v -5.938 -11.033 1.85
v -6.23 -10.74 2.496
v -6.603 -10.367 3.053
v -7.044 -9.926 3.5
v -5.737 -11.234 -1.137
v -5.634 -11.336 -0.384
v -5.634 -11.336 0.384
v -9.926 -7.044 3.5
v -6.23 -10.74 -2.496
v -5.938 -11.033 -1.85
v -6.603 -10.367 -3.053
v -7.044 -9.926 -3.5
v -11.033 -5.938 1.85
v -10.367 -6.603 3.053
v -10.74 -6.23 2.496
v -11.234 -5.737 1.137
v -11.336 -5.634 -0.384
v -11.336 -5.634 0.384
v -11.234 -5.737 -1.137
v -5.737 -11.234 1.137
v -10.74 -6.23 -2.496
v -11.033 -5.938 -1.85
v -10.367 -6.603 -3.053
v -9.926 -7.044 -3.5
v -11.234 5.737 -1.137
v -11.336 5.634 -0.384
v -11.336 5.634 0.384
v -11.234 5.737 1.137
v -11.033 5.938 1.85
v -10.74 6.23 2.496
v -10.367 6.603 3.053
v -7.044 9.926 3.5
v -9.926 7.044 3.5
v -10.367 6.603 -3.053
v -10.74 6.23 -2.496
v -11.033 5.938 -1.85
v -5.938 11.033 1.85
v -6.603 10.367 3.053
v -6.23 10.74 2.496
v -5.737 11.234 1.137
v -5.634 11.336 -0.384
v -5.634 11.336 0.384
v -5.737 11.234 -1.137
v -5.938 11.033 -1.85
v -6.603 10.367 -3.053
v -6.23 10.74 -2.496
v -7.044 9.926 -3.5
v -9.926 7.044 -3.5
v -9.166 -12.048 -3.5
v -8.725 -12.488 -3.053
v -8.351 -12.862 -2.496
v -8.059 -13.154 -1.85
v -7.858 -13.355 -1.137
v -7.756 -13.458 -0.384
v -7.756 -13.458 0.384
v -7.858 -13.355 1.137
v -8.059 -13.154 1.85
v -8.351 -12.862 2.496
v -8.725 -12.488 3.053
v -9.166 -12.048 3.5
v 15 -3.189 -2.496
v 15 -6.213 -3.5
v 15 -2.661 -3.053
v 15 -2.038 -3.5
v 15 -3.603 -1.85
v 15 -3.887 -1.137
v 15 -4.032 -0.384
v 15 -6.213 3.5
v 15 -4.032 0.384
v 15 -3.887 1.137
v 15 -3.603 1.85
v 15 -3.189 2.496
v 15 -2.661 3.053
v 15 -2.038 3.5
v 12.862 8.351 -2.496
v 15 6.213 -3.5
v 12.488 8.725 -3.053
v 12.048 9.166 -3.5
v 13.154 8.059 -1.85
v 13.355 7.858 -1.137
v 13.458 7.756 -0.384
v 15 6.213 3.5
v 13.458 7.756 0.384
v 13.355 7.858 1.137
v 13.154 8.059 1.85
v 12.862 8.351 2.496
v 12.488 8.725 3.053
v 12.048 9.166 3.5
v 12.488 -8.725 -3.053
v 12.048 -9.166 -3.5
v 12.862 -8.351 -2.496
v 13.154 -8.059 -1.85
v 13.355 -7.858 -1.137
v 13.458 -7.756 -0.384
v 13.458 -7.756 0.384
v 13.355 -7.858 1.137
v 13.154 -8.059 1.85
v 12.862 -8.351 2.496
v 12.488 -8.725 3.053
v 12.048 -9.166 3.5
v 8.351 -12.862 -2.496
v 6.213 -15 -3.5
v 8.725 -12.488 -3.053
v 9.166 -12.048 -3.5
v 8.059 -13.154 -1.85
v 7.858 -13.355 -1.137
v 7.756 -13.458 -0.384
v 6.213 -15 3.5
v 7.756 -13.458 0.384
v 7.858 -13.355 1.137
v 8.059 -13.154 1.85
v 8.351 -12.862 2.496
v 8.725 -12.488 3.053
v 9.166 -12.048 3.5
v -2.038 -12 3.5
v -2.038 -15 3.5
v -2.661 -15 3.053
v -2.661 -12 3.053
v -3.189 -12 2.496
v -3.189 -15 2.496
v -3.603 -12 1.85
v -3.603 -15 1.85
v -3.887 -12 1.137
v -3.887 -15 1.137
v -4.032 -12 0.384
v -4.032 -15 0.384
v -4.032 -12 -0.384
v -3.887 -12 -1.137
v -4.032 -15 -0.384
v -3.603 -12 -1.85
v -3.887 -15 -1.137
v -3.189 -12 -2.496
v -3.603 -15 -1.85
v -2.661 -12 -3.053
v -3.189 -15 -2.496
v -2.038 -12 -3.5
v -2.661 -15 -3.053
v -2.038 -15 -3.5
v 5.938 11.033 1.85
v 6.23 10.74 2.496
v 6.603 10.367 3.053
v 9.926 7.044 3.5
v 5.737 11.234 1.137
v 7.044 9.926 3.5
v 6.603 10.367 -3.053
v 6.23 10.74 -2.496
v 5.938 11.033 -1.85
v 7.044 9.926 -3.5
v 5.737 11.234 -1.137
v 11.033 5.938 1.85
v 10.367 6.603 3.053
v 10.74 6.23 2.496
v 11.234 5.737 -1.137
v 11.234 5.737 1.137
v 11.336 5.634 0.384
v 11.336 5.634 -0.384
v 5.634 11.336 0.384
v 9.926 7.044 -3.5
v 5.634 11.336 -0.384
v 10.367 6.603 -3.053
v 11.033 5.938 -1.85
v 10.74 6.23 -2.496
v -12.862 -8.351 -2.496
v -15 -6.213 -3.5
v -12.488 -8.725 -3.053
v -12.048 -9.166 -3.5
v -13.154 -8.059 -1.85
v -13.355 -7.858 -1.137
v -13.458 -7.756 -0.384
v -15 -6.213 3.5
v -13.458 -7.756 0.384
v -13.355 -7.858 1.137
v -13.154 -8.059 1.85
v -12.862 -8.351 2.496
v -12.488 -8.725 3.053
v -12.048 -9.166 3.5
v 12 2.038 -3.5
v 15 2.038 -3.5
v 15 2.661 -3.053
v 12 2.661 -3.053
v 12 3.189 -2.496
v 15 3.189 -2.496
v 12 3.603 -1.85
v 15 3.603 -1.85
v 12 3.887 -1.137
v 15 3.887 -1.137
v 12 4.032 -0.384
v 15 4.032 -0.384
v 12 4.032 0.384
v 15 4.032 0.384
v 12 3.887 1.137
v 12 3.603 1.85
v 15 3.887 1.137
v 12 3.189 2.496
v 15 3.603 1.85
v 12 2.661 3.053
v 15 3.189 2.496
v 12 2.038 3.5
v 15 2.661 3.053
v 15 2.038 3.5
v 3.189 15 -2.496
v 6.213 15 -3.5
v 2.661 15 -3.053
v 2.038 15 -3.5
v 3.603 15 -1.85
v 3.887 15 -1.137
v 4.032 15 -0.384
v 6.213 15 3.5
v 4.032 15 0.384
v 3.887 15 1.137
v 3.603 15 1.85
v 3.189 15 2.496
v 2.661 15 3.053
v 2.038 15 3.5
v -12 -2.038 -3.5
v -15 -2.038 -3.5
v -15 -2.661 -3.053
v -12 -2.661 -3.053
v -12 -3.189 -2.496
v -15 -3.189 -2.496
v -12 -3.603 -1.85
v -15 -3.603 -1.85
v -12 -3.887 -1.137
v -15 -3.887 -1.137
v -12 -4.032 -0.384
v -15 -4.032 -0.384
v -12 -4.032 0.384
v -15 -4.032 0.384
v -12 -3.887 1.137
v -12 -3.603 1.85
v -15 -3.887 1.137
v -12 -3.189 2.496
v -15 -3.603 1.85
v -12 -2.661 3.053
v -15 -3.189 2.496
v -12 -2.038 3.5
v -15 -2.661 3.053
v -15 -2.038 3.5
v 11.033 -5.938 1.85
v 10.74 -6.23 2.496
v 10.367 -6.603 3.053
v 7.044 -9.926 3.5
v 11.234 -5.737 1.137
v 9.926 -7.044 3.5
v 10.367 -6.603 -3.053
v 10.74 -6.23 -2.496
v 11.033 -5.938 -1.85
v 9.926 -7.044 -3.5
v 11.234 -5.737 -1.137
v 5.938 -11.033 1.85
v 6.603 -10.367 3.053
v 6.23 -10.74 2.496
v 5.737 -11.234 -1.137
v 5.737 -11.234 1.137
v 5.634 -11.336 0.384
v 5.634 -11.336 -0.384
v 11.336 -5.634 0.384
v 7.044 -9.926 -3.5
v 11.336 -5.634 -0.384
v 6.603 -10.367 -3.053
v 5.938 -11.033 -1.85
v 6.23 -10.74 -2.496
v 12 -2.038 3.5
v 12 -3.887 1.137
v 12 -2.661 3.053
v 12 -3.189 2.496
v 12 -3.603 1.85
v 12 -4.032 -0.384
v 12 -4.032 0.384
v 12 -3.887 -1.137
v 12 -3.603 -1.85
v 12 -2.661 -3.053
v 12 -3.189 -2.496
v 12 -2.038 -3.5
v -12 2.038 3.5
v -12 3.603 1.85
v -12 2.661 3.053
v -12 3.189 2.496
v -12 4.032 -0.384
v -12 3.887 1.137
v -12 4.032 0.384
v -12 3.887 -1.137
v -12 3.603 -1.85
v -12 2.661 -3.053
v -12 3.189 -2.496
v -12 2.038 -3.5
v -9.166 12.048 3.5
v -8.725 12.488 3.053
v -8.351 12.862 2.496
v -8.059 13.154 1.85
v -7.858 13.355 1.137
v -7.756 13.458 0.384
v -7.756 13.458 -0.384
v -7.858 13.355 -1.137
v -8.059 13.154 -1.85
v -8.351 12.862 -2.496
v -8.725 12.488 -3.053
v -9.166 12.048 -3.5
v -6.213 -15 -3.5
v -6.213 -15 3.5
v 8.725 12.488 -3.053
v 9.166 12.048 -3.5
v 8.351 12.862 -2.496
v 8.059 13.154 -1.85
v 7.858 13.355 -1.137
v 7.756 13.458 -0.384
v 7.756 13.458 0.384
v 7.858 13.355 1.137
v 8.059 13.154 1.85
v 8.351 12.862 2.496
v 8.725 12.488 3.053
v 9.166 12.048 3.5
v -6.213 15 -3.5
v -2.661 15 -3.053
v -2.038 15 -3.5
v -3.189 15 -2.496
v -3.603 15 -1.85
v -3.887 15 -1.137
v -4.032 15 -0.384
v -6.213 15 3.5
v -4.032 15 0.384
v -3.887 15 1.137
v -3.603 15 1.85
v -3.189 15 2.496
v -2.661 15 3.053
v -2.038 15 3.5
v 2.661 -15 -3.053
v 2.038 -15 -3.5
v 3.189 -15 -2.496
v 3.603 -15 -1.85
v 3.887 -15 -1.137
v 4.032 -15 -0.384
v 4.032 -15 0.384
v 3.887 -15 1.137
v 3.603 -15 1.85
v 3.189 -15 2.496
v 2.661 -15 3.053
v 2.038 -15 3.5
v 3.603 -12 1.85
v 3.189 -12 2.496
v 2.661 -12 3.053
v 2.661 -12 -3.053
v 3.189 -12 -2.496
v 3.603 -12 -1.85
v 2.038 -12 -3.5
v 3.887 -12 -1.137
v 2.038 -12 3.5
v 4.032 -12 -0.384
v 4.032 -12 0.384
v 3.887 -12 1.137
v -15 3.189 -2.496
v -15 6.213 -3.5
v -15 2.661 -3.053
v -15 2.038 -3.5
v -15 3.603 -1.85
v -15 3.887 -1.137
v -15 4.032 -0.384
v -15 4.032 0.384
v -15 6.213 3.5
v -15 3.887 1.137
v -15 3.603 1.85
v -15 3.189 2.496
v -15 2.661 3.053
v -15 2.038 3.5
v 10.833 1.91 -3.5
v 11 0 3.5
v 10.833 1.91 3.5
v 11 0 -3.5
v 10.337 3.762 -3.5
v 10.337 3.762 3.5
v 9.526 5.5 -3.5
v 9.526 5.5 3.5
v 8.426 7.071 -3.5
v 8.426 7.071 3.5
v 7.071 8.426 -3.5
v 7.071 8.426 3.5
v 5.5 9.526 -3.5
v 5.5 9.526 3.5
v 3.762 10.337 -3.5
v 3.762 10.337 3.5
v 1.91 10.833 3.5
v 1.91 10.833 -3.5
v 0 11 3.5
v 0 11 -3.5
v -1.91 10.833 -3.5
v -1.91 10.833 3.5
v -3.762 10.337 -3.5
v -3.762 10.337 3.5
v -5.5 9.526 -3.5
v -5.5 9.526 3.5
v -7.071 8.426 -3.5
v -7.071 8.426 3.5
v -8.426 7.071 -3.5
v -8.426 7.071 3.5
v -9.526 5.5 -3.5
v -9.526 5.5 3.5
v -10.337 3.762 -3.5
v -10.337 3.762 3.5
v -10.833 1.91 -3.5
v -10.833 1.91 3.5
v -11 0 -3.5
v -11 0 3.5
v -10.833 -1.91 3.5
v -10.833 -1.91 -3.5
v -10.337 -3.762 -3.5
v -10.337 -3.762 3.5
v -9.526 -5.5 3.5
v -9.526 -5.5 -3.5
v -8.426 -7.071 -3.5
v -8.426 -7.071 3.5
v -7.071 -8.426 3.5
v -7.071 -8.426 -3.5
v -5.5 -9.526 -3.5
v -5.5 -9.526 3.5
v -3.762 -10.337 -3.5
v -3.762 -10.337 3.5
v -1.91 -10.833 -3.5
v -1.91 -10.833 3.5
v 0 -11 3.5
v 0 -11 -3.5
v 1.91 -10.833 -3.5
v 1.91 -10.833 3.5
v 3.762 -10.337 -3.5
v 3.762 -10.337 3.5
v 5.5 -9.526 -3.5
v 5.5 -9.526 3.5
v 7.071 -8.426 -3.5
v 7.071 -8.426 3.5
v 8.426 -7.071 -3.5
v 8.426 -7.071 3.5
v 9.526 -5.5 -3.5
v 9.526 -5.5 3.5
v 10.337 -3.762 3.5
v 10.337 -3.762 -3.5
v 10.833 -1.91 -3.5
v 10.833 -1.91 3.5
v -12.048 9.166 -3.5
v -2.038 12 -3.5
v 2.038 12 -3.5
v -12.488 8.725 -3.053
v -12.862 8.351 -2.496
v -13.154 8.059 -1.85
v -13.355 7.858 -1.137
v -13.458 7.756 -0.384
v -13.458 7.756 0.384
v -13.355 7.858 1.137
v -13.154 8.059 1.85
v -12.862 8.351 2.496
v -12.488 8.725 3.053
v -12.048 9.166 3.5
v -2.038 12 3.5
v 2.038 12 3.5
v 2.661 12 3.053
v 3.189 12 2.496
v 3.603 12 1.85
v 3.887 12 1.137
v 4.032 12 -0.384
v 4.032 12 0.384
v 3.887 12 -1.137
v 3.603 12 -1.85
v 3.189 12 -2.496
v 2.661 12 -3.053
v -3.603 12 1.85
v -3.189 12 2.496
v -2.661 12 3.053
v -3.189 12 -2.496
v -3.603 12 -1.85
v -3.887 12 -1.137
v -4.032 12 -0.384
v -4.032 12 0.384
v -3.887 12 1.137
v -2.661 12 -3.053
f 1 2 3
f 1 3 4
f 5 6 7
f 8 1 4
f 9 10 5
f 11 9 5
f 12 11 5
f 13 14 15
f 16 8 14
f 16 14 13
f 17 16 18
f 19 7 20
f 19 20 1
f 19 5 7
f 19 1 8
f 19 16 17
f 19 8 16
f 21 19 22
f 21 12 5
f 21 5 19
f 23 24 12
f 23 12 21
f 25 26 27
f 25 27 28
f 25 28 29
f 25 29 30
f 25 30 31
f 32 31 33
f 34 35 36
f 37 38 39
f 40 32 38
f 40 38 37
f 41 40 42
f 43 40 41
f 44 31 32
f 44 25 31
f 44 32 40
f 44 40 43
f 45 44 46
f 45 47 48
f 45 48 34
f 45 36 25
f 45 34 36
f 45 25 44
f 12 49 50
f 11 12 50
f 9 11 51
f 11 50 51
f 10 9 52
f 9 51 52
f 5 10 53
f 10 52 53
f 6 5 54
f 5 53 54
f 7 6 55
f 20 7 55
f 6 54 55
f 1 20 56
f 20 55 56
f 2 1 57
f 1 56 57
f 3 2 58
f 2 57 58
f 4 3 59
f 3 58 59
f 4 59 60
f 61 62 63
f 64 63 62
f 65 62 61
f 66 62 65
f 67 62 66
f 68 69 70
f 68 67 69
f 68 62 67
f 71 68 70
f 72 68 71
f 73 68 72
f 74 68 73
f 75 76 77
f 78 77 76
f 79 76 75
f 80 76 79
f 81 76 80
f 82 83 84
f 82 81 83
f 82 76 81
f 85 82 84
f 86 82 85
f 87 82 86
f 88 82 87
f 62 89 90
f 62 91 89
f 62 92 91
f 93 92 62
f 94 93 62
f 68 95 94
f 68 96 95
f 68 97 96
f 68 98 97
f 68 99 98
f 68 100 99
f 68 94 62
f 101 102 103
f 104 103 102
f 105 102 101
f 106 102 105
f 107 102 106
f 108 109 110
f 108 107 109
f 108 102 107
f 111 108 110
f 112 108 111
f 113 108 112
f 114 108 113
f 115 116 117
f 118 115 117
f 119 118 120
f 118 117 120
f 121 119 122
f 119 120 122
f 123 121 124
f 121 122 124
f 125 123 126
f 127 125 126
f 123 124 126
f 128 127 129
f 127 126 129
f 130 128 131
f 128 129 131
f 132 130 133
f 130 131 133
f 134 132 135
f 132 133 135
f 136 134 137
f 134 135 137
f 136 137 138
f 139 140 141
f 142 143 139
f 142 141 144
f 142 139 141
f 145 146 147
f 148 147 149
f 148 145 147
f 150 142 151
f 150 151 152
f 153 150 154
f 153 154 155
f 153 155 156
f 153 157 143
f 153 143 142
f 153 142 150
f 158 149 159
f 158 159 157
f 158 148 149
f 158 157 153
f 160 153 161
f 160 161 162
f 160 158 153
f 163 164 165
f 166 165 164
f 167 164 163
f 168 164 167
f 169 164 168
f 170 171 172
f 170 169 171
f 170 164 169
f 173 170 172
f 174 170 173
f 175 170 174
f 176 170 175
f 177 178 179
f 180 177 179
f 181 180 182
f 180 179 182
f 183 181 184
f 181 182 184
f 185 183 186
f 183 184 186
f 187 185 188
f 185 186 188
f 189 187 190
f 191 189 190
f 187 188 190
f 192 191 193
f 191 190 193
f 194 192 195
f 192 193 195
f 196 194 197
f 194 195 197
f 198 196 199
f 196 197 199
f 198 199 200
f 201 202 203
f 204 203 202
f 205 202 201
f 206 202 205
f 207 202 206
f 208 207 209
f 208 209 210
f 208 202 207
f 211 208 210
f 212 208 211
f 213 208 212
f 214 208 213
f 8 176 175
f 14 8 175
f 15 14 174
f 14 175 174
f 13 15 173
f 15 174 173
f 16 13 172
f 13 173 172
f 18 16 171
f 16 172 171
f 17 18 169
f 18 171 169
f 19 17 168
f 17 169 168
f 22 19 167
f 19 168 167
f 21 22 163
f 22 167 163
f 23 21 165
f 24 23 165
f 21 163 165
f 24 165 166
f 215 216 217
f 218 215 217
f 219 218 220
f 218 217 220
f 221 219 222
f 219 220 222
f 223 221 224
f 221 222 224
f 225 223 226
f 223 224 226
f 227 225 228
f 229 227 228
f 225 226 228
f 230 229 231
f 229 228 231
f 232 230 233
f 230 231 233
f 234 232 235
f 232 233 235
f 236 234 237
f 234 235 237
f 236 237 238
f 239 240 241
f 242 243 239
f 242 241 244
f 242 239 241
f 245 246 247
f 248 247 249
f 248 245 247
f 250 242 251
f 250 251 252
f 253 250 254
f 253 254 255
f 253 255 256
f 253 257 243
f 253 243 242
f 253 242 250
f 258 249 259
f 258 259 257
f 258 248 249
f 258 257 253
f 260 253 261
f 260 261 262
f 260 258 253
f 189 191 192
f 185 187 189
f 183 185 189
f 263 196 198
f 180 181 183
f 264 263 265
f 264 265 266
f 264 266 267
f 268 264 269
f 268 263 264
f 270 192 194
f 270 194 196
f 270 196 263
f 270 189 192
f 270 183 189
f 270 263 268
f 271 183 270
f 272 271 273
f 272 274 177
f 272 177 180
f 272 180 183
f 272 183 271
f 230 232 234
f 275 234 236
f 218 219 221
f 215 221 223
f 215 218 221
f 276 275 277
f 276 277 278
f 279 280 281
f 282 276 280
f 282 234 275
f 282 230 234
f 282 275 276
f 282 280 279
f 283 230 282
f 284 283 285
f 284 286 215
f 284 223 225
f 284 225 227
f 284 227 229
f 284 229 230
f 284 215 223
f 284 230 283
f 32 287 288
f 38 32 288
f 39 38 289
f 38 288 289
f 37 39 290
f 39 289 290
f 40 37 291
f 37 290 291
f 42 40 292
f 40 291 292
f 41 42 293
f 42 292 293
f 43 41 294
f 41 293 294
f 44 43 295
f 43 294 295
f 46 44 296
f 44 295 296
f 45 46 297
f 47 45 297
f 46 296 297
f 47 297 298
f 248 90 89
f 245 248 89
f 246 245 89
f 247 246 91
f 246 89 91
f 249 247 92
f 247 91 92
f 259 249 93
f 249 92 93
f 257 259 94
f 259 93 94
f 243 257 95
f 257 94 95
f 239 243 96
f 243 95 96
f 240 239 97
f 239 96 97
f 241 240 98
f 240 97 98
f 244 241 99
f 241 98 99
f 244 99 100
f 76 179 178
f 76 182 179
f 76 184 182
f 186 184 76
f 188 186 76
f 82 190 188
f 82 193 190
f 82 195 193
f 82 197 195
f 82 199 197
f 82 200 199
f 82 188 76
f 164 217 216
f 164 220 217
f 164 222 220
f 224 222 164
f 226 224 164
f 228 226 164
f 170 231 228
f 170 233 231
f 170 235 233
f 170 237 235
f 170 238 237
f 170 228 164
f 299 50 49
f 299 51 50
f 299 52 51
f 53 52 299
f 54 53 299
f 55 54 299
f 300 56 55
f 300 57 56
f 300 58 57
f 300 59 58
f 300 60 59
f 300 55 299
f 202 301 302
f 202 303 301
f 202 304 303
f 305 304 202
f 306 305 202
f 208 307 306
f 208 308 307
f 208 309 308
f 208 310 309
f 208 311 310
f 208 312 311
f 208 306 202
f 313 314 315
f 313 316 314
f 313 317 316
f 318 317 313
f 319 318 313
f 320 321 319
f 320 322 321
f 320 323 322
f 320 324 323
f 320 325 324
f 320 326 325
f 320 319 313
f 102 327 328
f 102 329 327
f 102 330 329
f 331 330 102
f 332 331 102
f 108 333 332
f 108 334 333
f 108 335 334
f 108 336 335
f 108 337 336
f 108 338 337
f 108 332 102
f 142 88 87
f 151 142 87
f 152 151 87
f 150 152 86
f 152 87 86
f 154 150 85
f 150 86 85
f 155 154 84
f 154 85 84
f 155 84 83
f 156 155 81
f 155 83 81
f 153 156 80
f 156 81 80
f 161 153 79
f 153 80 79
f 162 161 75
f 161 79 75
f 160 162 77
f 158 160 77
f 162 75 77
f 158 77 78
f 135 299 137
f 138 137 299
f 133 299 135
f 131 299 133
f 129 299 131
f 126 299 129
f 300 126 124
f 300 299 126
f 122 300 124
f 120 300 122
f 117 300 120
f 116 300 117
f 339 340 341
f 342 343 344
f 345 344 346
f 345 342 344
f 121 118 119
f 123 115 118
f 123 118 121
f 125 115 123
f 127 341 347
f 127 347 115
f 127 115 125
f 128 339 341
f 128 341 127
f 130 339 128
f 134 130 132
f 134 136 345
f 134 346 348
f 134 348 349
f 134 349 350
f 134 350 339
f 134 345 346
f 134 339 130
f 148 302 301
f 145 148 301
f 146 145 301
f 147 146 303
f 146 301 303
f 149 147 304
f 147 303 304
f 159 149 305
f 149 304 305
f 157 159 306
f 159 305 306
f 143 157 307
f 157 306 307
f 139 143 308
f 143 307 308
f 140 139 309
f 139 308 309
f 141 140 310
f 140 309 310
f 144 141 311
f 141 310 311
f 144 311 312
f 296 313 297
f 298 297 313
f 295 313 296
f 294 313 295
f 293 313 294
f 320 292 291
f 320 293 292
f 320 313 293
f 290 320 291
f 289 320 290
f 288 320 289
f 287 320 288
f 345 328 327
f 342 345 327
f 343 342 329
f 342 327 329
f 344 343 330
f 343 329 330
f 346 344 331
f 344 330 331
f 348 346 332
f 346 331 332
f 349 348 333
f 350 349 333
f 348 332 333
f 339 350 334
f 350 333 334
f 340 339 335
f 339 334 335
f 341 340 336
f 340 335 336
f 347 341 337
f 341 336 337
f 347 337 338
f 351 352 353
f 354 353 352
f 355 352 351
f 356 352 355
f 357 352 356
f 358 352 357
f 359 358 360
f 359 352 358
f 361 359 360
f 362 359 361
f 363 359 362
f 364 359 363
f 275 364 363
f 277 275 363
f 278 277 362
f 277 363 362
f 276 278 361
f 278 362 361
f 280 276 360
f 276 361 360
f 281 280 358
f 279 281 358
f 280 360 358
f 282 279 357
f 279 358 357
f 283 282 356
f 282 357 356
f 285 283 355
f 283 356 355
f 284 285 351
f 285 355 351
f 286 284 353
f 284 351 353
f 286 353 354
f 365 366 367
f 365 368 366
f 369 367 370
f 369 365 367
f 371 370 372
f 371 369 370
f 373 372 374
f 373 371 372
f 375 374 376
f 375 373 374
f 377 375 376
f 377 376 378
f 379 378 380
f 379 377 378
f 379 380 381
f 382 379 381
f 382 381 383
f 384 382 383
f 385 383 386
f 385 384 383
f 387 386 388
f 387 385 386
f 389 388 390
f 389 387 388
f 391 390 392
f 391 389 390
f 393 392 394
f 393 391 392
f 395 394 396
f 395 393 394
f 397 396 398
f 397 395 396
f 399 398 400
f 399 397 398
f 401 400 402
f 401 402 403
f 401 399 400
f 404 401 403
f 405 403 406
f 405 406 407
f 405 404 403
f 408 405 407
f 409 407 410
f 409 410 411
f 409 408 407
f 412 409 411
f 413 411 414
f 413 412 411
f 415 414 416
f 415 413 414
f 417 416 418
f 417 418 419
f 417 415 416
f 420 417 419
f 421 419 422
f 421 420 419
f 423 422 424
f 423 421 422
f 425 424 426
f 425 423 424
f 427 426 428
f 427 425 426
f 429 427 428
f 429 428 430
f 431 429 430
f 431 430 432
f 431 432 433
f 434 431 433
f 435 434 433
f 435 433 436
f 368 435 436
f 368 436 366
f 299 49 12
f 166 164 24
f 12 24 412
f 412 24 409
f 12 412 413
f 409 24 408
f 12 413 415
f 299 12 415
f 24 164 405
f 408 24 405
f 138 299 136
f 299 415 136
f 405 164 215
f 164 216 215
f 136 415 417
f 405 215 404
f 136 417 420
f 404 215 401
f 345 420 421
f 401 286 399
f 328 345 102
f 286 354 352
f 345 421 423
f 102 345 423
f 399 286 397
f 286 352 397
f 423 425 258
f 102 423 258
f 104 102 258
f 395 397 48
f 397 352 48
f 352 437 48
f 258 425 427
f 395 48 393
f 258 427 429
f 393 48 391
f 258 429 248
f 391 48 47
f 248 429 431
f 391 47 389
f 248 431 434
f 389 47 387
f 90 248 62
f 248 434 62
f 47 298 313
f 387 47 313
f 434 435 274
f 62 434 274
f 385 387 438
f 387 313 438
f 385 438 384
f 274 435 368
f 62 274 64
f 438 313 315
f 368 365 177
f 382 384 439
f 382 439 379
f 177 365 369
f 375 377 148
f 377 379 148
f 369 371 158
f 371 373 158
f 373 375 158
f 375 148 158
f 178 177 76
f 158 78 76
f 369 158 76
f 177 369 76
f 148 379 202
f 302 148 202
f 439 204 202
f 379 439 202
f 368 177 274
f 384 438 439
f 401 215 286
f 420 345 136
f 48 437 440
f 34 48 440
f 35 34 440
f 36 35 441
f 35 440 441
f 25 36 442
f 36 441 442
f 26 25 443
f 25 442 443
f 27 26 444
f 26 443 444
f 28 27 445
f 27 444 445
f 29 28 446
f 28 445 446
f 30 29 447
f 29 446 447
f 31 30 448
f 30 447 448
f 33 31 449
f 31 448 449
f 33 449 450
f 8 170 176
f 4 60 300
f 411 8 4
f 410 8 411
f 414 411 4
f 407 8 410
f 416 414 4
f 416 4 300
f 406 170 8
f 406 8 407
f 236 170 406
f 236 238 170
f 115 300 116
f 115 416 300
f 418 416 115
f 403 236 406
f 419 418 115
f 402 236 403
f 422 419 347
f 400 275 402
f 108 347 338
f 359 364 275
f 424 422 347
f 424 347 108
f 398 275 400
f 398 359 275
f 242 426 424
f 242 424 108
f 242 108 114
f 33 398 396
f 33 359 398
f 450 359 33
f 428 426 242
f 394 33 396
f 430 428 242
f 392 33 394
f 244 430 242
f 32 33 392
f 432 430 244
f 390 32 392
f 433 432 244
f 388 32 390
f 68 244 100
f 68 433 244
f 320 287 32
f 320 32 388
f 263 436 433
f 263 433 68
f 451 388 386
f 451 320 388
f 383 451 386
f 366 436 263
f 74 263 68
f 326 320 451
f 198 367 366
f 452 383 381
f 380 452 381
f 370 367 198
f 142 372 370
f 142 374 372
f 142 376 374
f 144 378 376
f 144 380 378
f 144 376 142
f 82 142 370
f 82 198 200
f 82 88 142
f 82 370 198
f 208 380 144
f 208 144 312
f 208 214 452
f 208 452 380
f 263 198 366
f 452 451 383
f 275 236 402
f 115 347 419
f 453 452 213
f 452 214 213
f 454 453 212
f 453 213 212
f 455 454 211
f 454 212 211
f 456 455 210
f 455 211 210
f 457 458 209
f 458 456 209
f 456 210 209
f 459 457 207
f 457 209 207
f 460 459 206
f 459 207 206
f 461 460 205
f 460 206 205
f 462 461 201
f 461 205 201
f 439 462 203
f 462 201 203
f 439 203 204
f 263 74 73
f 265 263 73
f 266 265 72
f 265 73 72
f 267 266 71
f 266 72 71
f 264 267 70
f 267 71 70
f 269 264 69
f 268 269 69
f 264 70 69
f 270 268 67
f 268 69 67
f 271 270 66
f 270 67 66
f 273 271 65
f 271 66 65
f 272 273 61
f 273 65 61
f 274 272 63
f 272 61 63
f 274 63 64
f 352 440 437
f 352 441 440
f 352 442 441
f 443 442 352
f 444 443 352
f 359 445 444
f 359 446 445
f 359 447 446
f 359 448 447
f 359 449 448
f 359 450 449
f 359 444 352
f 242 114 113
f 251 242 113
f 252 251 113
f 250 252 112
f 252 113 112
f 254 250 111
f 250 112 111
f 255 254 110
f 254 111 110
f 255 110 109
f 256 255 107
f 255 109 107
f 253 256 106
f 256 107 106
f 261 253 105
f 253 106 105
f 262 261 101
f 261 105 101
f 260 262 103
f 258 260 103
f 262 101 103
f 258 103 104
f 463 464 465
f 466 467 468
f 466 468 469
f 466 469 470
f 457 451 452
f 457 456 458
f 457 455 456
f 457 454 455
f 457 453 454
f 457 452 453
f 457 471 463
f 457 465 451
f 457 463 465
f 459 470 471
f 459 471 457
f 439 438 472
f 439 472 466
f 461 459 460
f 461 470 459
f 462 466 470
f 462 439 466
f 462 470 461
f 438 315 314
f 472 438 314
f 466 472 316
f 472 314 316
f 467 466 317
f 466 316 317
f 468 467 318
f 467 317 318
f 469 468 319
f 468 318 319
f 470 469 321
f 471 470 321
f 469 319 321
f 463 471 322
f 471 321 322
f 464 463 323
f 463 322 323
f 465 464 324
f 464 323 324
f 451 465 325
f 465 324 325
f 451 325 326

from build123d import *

# Parameters (mm, degrees)
SKETCH1_R           = 11
BOSS_EXTRUDE1_DEPTH = 3.5
SKETCH2_R           = 4.05
CUT_EXTRUDE3_DEPTH  = 3
CIRPATTERN1_COUNT   = 8


with BuildPart() as part:
    # Sketch1 → Boss-Extrude1 (new, symmetric)
    with BuildSketch(Plane.XY):
        Polygon((6.213203436, 15), (-6.213203436, 15), (-15, 6.213203436), (-15, -6.213203436), (-6.213203436, -15), (6.213203436, -15), (15, -6.213203436), (15, 6.213203436), align=None)
        Circle(SKETCH1_R, mode=Mode.SUBTRACT)
    extrude(amount=BOSS_EXTRUDE1_DEPTH, both=True)

    # Sketch2 → Cut-Extrude3 (cut)
    with BuildSketch(Plane(origin=(0, -15, 0), x_dir=(-1, 0, 0), z_dir=(0, -1, 0))):
        Circle(SKETCH2_R)
    cut_extrude3 = extrude(amount=-CUT_EXTRUDE3_DEPTH, mode=Mode.SUBTRACT)

    # CirPattern1: Cut-Extrude3 ×8 about axis
    cirpattern1_axis = Axis((0, 0, 3.5), (0, 0, 1))
    for i in range(1, CIRPATTERN1_COUNT):
        add(cut_extrude3.rotate(cirpattern1_axis, i * 360 / CIRPATTERN1_COUNT), mode=Mode.SUBTRACT)


solid = part.part
